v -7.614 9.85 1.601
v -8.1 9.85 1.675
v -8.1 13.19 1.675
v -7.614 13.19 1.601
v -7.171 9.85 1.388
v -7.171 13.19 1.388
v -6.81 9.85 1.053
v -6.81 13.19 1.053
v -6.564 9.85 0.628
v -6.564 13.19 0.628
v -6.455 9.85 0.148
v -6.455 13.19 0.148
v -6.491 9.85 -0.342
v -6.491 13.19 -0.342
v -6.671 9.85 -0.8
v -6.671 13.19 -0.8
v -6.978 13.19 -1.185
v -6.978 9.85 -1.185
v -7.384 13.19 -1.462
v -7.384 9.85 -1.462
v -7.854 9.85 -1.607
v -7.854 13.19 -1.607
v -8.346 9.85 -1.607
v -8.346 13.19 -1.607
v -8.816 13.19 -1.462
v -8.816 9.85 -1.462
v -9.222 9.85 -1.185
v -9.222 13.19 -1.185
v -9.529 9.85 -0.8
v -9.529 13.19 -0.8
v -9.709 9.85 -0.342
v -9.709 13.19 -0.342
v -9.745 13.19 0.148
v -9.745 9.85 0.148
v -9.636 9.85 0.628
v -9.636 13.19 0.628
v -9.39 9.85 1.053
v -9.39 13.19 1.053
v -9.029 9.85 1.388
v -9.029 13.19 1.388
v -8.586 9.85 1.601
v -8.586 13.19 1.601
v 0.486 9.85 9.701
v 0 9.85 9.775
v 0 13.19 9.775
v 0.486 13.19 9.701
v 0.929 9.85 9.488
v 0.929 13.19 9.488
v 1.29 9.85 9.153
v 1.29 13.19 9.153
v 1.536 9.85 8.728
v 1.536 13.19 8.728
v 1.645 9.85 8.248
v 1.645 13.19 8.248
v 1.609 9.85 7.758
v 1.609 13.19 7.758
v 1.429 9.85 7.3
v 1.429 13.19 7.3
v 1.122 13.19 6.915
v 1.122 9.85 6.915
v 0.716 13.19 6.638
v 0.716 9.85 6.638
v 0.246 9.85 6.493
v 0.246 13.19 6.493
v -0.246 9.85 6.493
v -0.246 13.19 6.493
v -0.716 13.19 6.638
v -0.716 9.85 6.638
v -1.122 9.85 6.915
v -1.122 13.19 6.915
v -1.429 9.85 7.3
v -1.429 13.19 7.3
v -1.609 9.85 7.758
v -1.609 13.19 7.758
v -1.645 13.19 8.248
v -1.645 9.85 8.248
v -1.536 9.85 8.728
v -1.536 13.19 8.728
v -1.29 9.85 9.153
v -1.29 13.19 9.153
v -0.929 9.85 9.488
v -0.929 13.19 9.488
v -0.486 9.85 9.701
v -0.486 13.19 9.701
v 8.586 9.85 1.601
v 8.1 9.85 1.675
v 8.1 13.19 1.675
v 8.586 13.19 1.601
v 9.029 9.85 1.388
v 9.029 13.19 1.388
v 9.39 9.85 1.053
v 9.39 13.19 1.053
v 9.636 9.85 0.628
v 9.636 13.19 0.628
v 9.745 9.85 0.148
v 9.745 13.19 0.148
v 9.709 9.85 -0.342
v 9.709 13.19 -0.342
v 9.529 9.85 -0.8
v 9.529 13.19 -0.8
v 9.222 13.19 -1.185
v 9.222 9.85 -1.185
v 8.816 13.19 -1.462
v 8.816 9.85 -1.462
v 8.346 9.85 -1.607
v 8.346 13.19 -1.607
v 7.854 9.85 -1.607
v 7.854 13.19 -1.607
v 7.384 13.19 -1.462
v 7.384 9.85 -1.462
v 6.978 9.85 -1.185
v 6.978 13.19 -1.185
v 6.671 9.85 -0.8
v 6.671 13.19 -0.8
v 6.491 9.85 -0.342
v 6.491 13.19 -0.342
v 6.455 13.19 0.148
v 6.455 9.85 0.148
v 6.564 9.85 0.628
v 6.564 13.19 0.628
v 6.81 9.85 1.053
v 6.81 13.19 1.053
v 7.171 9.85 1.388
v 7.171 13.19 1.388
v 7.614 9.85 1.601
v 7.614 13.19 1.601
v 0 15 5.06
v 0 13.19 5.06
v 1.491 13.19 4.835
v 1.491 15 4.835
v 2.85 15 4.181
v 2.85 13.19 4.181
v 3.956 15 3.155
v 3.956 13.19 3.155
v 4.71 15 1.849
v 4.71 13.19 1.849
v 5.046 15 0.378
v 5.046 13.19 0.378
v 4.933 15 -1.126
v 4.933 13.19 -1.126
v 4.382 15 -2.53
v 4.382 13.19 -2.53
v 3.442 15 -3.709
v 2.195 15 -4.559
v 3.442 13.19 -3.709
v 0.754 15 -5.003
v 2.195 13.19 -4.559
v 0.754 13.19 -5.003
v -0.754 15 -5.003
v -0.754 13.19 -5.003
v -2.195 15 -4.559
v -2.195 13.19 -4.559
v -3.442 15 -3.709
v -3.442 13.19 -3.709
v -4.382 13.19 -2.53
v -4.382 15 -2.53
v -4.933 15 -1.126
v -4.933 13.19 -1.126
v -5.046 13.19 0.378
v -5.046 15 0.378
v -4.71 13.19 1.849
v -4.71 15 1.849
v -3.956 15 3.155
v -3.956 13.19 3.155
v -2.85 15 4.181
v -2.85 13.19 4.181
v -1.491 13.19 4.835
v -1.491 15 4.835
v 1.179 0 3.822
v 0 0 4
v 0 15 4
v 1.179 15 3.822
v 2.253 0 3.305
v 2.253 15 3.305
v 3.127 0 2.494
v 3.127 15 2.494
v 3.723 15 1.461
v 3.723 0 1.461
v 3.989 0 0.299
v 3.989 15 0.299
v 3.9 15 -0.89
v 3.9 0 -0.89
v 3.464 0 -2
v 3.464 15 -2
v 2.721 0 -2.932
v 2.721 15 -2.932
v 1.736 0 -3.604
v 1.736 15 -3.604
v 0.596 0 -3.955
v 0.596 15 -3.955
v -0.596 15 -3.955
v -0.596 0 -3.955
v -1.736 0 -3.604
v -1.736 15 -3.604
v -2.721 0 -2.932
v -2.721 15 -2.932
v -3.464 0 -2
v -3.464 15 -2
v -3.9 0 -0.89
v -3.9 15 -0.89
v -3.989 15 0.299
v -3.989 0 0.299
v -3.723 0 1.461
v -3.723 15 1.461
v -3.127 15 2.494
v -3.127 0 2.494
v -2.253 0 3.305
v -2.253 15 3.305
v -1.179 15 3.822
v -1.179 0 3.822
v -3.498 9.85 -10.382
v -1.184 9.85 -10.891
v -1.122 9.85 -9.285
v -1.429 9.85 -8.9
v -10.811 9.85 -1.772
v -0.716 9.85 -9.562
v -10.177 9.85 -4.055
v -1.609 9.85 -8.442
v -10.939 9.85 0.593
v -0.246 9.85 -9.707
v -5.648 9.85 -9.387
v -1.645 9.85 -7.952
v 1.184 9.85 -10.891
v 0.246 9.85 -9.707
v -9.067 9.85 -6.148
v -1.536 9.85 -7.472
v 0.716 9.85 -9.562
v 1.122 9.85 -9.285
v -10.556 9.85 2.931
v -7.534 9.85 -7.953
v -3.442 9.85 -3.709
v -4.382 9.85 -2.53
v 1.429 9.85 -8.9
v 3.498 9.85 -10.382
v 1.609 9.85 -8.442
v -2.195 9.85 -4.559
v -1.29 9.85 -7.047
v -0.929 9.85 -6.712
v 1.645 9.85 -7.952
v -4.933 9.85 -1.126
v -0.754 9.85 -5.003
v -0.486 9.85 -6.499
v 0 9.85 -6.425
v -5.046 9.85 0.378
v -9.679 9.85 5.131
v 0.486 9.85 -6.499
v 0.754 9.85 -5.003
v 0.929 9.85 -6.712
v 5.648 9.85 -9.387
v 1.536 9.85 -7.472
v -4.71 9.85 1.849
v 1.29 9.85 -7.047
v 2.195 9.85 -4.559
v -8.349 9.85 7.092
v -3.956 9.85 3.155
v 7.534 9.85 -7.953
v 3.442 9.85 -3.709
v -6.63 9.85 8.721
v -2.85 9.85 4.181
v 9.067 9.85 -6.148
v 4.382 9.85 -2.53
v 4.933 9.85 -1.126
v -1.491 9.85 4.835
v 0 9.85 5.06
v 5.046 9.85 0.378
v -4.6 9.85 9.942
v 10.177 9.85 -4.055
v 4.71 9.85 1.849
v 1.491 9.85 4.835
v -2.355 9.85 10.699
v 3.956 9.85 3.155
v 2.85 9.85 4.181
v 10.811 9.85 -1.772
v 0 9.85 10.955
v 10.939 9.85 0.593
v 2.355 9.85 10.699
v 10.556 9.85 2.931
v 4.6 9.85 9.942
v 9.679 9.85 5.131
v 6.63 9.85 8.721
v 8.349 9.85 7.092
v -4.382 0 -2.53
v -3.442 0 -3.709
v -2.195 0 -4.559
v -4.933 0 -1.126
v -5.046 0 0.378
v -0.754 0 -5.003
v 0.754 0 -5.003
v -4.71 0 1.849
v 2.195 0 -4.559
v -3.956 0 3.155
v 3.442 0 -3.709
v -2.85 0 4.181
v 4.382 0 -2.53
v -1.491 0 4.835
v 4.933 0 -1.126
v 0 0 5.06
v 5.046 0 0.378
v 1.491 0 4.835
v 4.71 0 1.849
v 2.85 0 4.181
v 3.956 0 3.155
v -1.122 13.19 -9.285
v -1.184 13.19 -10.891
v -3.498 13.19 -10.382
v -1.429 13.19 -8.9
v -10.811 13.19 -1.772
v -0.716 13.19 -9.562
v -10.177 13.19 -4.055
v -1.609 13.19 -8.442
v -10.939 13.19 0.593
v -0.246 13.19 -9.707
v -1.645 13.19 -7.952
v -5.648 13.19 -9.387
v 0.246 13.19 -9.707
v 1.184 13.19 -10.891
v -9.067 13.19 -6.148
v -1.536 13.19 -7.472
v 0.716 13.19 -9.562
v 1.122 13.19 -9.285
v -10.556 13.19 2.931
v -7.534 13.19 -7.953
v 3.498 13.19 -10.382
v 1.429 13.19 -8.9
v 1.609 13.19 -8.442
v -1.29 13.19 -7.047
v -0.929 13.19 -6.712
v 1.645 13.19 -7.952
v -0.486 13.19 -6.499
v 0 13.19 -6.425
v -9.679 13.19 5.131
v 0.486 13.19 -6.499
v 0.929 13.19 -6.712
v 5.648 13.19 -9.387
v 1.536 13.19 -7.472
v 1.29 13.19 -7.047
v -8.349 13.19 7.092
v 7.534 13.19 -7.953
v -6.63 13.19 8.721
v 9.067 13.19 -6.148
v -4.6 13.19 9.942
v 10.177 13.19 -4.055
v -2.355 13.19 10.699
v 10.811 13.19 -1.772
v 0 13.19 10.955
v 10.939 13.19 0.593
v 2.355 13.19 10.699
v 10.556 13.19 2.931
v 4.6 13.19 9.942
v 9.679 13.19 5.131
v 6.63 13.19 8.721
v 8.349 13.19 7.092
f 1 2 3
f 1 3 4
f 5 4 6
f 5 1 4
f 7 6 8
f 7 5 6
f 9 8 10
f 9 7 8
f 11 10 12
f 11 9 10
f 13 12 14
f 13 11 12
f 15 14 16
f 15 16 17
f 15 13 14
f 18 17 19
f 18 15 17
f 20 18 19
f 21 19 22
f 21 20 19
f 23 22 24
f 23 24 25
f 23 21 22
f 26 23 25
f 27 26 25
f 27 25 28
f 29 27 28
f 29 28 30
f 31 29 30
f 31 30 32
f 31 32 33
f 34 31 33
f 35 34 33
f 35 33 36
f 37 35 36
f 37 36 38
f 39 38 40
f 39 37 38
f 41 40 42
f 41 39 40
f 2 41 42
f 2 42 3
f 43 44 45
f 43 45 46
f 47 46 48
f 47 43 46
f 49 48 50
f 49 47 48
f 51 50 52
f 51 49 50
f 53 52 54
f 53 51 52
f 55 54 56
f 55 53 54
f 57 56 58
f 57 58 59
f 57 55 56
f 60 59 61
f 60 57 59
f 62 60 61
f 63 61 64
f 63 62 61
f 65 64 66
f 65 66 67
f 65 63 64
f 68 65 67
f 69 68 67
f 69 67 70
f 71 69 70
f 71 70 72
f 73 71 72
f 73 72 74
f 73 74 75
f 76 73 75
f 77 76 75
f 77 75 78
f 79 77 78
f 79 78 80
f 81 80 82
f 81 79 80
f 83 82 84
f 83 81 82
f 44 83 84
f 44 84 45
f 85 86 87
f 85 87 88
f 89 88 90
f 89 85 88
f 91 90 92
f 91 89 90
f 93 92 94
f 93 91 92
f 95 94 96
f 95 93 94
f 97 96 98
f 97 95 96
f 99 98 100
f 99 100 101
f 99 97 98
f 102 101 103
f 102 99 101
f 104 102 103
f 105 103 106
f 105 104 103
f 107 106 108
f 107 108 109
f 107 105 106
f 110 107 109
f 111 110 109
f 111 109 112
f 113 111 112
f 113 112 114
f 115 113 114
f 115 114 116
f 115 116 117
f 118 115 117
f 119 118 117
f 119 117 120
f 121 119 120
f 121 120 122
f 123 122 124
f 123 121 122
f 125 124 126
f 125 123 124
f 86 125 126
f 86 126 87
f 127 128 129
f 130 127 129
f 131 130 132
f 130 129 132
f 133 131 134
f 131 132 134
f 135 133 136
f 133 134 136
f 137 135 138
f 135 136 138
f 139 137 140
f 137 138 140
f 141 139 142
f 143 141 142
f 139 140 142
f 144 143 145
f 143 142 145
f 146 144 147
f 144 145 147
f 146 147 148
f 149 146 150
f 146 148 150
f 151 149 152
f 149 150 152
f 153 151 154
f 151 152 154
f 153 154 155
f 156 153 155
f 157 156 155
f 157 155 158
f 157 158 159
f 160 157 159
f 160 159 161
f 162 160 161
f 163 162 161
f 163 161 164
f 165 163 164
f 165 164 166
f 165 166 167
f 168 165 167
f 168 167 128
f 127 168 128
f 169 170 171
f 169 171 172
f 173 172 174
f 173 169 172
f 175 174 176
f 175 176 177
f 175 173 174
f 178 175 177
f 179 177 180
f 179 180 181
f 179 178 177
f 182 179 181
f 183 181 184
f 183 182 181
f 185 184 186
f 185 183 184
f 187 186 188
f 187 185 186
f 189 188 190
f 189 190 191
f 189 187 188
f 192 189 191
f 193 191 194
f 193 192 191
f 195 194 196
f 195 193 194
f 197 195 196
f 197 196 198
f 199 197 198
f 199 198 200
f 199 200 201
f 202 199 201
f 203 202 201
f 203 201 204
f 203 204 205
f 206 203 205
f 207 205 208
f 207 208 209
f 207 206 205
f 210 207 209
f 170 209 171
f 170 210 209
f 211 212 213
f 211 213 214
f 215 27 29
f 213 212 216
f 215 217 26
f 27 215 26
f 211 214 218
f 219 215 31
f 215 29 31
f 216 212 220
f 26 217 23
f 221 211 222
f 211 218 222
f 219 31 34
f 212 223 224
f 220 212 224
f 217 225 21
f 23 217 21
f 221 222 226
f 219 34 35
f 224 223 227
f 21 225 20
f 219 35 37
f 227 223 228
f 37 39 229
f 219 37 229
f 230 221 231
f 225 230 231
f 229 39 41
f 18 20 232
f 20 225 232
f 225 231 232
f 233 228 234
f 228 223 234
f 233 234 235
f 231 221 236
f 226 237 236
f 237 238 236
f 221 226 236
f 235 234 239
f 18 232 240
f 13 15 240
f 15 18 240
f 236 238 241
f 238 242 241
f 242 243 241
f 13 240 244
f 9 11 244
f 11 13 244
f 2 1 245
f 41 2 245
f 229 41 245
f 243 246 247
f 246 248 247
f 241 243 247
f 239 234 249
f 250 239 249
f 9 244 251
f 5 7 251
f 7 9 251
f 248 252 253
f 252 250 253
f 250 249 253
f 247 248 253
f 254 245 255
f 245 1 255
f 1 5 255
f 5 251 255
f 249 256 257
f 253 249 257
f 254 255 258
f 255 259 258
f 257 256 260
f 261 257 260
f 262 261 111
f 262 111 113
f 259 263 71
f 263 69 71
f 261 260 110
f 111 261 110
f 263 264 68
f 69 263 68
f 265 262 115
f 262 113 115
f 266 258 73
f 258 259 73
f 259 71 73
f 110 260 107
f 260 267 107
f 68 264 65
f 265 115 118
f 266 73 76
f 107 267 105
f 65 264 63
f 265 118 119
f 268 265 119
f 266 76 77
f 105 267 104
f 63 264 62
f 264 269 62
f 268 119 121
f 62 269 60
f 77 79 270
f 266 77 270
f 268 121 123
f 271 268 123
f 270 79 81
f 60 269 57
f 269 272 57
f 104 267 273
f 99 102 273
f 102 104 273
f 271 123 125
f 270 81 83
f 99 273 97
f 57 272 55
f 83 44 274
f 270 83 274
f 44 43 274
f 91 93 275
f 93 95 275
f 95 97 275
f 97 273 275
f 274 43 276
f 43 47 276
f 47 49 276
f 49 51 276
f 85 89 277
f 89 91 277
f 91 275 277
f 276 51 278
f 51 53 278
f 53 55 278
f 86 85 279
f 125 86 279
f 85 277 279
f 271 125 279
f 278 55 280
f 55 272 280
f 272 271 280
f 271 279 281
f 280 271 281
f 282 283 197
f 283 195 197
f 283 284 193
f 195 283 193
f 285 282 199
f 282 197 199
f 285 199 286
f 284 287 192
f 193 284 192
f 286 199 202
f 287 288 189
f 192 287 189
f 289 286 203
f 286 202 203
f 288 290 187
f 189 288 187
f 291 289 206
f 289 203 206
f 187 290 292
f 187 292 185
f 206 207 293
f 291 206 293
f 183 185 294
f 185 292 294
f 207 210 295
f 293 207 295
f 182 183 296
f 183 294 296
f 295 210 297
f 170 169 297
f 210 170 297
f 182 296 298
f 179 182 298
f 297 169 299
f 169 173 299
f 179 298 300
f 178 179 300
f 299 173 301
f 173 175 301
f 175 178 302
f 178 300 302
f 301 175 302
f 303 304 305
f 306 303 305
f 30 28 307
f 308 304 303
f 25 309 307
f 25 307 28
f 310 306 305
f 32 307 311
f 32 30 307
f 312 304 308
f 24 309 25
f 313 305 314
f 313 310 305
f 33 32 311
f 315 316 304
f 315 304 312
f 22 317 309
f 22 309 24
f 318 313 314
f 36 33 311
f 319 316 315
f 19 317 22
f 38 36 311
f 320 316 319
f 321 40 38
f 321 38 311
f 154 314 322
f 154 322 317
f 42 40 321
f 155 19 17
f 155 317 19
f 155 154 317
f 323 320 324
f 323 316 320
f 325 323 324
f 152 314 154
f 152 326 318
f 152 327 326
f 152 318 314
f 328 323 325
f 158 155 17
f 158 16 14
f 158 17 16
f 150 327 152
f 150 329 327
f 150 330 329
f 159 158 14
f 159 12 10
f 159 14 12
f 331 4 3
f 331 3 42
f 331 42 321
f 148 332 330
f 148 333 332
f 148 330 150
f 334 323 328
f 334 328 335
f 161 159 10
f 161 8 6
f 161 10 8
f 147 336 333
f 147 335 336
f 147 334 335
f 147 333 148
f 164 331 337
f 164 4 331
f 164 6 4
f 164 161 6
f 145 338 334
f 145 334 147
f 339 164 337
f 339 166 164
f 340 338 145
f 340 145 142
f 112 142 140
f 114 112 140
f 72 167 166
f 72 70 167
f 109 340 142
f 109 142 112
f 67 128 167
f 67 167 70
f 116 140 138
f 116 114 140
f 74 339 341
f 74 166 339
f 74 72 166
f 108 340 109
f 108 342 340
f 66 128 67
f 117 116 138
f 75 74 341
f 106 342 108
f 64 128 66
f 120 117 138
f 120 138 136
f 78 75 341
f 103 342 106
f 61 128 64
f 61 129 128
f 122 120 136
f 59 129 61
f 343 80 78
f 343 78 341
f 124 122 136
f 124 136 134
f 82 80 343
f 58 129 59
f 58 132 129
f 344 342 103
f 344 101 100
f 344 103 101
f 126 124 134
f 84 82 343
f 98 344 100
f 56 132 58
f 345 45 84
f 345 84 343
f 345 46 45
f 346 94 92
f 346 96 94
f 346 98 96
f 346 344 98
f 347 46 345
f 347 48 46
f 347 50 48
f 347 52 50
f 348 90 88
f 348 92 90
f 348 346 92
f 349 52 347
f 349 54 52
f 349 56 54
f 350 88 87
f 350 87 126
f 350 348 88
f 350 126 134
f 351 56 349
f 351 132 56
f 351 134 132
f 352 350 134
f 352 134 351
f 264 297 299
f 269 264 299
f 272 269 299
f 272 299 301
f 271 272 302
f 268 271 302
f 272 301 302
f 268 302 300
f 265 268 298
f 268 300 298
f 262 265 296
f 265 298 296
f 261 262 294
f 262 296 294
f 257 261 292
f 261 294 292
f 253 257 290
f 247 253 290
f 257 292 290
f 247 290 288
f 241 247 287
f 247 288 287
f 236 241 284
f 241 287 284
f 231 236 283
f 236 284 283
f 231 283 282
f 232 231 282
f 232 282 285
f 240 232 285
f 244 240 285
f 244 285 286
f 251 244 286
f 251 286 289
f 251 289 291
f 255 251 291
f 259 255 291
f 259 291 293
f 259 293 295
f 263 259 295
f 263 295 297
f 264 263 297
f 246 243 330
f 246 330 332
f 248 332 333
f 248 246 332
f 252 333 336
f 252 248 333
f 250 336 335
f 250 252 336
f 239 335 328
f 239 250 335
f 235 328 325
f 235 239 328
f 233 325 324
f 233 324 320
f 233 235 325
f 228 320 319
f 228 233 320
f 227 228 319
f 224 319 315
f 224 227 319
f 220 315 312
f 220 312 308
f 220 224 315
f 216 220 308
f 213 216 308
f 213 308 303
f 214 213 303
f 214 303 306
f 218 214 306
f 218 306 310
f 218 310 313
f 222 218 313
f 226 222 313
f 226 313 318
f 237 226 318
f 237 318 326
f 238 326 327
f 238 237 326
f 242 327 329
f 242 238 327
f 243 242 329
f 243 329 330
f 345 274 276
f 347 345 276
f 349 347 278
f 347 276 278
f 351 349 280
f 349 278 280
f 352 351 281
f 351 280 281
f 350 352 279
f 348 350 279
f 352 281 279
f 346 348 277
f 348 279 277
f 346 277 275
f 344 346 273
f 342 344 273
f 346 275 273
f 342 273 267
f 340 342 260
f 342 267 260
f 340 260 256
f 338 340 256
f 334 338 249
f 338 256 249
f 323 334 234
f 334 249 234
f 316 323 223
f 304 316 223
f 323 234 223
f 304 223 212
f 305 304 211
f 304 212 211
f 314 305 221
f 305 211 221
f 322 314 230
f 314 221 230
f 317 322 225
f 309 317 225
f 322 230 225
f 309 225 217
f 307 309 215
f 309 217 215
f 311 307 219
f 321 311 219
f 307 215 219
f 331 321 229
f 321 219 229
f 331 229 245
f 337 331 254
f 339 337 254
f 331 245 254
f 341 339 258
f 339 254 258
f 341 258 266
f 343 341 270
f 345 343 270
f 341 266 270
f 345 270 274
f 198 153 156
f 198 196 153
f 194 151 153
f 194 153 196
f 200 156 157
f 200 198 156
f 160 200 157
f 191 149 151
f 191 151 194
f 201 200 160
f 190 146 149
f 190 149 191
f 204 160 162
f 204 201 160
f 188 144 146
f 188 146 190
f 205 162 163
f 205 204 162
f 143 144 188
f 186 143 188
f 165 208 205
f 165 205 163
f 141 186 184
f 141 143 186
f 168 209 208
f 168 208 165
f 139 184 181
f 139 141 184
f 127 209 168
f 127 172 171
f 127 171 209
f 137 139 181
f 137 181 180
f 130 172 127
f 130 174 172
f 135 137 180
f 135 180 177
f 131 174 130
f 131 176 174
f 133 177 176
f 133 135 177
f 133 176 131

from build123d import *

# Parameters (mm, degrees)
SKETCH_1_R      = 5.06
SKETCH_1_R_2    = 4
EXTRUDE_1_DEPTH = 15
EXTRUDE_START   = 9.85
SKETCH_1_3_R    = 10.955
SKETCH_1_3_R_2  = 1.65
SKETCH_1_3_R_3  = 5.06
EXTRUDE_2_DEPTH = 3.34


with BuildPart() as part:
    # Эскиз1 → Бобышка-Вытянуть1 (new body)
    with BuildSketch(Plane(origin=(0, 0, 0), x_dir=(1, 0, 0), z_dir=(0, 1, 0))):
        Circle(SKETCH_1_R)
        Circle(SKETCH_1_R_2, mode=Mode.SUBTRACT)
    extrude(amount=EXTRUDE_1_DEPTH)

    # Эскиз1<3> → Бобышка-Вытянуть2 (add)
    with BuildSketch(Plane(origin=(0, 0, 0), x_dir=(1, 0, 0), z_dir=(0, 1, 0)).offset(EXTRUDE_START)):
        Circle(SKETCH_1_3_R)
        with Locations((-8.1, -0.024689505)):
            Circle(SKETCH_1_3_R_2, mode=Mode.SUBTRACT)
        with Locations((0, -8.124689505)):
            Circle(SKETCH_1_3_R_2, mode=Mode.SUBTRACT)
        with Locations((8.1, -0.024689505)):
            Circle(SKETCH_1_3_R_2, mode=Mode.SUBTRACT)
        Circle(SKETCH_1_3_R_3, mode=Mode.SUBTRACT)
        with Locations((0, 8.075310495)):
            Circle(SKETCH_1_3_R_2, mode=Mode.SUBTRACT)
    extrude(amount=EXTRUDE_2_DEPTH)


solid = part.part
